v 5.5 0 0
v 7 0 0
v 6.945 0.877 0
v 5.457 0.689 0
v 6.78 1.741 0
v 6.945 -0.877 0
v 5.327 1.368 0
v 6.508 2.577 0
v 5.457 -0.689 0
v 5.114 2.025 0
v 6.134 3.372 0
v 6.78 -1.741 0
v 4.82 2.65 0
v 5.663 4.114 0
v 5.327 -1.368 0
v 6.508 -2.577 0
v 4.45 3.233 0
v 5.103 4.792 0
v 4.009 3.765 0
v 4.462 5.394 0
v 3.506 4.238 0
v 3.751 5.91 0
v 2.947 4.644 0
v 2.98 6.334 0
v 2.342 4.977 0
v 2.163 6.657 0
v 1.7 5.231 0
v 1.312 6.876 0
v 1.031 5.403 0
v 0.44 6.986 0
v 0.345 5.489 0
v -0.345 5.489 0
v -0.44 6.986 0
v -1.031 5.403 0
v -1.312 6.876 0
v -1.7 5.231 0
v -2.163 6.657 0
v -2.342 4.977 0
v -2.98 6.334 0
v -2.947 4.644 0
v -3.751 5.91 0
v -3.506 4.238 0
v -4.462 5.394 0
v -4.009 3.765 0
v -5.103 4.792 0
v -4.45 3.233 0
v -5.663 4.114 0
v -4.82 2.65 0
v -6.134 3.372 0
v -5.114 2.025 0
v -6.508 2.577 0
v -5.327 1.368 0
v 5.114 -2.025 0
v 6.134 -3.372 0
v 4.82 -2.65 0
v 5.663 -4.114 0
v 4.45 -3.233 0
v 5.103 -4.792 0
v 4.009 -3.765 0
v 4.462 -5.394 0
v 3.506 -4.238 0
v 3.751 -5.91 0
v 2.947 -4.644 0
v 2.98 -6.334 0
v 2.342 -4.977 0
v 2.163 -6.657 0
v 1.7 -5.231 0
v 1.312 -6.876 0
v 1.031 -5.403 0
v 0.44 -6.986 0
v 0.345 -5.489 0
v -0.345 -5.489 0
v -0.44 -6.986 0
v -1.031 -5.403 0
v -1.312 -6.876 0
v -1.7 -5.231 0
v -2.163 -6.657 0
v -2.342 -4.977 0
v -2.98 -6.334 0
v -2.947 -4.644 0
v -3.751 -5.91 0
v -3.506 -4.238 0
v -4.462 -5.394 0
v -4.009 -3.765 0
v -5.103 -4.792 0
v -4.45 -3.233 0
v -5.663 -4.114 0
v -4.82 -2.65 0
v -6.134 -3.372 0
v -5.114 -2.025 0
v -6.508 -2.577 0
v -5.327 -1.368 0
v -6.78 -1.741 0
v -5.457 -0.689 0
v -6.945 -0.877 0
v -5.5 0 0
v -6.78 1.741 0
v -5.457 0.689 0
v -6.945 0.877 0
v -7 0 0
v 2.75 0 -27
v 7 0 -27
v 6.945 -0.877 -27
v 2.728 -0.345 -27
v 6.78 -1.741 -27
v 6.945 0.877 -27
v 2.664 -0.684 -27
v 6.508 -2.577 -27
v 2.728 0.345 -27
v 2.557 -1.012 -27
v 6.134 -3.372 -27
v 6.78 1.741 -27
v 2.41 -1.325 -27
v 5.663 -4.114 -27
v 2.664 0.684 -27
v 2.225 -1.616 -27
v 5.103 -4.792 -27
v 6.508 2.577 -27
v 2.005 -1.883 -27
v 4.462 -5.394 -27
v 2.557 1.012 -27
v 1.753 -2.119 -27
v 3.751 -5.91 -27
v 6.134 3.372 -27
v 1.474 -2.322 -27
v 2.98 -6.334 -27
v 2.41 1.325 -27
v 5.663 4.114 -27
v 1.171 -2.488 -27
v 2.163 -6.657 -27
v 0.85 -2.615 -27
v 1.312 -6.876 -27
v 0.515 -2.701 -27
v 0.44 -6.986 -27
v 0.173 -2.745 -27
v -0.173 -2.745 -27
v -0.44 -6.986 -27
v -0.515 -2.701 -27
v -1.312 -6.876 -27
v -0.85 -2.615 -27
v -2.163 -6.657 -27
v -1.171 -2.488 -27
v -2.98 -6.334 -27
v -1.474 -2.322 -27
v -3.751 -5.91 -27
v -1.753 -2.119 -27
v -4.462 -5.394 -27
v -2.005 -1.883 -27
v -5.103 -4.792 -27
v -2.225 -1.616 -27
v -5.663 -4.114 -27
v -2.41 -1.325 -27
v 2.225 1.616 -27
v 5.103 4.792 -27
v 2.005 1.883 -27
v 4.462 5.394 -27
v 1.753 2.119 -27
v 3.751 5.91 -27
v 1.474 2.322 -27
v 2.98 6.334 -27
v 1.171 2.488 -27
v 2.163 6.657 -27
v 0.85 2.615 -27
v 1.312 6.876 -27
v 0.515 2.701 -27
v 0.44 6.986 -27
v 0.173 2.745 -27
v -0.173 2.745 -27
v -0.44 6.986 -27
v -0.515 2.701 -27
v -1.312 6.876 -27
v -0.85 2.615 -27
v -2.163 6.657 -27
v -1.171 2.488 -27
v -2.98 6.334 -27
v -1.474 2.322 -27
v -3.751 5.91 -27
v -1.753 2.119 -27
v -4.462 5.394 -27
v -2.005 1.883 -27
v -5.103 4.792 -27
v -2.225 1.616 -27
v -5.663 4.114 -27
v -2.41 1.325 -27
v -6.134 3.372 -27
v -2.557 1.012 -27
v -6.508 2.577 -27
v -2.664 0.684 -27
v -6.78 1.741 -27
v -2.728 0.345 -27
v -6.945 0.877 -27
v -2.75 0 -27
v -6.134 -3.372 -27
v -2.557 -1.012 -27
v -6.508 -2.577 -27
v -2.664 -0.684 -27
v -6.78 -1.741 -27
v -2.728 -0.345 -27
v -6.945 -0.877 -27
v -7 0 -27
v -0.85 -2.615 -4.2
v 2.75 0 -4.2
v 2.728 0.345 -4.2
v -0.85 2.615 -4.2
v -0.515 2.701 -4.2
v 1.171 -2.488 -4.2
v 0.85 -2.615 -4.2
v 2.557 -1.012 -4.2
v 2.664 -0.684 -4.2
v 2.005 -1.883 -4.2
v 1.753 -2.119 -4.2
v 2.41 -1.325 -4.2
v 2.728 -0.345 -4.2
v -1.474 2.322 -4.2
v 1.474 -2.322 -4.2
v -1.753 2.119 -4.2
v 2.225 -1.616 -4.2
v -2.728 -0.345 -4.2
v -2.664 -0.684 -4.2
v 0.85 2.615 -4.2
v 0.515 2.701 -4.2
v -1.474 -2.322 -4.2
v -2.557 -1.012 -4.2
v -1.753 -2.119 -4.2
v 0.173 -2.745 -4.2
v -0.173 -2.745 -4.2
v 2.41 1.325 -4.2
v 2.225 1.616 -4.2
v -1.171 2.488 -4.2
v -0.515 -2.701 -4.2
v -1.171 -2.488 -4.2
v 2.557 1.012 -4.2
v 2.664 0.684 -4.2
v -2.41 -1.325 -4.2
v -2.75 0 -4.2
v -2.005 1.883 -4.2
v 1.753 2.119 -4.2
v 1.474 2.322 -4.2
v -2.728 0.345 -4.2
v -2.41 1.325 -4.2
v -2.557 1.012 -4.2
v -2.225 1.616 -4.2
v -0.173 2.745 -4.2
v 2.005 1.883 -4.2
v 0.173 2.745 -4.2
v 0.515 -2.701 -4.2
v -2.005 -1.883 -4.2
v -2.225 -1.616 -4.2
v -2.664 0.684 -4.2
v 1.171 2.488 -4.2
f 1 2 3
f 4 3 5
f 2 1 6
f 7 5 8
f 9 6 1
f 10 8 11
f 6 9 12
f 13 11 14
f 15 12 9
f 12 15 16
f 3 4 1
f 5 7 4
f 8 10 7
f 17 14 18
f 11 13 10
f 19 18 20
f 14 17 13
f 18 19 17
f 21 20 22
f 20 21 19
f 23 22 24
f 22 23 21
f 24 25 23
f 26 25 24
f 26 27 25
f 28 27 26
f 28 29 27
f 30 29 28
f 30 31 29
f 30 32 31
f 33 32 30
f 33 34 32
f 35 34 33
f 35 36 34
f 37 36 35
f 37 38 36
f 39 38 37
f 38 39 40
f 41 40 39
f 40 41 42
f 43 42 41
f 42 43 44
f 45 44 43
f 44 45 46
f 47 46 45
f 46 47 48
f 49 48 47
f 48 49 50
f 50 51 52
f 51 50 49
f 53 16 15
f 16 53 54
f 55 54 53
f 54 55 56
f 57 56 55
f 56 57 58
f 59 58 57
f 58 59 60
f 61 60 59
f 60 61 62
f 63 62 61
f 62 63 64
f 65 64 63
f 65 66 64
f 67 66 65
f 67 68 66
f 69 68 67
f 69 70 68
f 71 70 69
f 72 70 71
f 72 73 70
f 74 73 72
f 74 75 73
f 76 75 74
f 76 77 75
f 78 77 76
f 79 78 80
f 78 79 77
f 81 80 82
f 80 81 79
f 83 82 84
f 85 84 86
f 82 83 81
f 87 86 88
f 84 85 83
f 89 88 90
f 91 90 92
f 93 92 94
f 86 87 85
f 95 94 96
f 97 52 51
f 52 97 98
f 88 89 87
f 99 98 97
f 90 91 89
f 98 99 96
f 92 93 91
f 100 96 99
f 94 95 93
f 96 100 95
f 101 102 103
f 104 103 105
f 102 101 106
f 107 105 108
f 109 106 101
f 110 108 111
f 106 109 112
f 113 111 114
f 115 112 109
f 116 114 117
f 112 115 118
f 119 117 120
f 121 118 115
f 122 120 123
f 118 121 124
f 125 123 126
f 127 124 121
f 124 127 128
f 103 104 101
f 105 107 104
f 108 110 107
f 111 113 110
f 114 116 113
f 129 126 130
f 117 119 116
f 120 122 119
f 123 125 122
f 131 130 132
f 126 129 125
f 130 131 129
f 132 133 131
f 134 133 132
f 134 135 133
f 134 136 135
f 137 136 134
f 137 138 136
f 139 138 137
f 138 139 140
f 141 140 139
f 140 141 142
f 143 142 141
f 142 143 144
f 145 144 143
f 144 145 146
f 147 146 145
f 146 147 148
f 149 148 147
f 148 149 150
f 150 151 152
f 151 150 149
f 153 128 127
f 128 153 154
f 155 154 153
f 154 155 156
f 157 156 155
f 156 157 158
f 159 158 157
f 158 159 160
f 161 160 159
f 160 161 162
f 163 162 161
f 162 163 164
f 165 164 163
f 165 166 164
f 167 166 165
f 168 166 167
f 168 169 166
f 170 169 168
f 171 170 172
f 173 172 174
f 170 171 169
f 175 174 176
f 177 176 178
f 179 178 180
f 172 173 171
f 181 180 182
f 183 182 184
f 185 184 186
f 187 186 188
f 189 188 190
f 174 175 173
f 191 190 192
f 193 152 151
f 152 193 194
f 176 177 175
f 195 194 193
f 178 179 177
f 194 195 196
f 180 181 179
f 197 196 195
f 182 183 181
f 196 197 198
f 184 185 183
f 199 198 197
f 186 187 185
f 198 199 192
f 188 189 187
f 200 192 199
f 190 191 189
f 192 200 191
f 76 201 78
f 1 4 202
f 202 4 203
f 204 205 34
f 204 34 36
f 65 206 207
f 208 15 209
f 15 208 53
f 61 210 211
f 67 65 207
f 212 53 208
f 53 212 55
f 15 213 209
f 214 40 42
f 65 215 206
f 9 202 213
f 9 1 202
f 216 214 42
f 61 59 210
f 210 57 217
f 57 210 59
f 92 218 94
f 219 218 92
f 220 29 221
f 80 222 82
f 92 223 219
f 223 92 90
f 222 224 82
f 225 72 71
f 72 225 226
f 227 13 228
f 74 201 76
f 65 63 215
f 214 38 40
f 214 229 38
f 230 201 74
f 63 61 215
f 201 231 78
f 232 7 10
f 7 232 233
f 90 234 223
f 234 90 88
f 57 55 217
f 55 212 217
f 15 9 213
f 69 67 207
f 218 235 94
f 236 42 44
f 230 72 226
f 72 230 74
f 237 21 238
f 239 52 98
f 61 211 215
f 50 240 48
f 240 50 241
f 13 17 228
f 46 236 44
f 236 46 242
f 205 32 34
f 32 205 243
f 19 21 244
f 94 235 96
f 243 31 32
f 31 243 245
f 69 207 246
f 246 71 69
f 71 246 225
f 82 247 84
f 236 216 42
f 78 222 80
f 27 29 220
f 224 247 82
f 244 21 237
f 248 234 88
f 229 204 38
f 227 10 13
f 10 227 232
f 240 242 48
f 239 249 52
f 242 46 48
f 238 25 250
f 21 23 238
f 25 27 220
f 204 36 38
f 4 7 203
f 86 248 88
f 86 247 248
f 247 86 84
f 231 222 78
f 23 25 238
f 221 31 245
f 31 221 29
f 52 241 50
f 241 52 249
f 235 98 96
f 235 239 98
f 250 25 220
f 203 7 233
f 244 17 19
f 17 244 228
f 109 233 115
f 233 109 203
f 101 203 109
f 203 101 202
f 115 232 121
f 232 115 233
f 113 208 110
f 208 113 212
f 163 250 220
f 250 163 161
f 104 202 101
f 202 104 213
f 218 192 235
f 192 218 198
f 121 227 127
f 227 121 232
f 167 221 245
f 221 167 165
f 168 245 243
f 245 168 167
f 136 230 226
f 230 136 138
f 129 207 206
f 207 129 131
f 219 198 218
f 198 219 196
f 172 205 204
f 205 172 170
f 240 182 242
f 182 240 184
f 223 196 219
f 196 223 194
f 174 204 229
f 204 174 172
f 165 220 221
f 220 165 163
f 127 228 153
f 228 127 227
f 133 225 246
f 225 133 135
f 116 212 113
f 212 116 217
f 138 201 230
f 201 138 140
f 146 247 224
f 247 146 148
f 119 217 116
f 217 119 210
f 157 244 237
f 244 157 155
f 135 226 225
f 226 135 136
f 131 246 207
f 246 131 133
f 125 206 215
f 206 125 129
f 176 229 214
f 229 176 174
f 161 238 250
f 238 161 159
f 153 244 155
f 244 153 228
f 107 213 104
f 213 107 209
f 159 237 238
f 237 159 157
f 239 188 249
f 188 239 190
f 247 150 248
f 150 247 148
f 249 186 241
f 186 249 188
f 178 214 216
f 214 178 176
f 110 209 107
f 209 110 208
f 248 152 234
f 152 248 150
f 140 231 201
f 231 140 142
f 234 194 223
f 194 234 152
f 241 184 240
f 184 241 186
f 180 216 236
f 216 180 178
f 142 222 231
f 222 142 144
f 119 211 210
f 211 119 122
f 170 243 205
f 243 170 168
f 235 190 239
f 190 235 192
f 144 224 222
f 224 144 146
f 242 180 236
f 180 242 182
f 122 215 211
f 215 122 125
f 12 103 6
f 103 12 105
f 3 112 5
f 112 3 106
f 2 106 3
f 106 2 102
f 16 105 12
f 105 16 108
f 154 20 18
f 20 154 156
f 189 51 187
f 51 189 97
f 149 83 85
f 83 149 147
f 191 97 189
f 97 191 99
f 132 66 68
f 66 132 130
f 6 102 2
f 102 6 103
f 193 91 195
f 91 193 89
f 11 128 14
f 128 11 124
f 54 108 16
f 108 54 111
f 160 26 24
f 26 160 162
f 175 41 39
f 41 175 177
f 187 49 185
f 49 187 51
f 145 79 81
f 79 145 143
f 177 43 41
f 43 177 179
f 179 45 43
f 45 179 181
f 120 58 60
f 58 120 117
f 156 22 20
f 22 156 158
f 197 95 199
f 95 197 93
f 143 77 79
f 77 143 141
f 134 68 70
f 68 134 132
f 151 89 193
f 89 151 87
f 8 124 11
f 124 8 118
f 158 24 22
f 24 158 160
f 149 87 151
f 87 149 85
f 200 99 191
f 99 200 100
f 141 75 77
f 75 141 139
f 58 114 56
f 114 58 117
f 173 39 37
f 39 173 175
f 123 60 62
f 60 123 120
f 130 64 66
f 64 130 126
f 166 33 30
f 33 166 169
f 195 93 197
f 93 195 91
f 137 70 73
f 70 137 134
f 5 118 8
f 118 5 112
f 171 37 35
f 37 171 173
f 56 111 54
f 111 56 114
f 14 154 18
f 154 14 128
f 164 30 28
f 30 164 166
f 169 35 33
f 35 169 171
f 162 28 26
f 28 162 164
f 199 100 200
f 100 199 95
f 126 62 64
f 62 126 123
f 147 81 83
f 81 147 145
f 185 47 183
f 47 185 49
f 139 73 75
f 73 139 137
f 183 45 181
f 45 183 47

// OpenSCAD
$fn = 50;


difference() {
	union() {
		translate(v = [0, 0, -27.0000000000]) {
			cylinder(h = 27, r = 7.0000000000);
		}
	}
	union() {
		translate(v = [0, 0, 0]) {
			rotate(a = [0, 0, 0]) {
				difference() {
					union() {
						#translate(v = [0, 0, -27.0000000000]) {
							cylinder(h = 27, r = 2.2500000000);
						}
						#translate(v = [0, 0, -4.2000000000]) {
							cylinder(h = 4.2000000000, r1 = 2.7500000000, r2 = 5.5000000000);
						}
						#translate(v = [0, 0, -27.0000000000]) {
							cylinder(h = 27, r = 2.7500000000);
						}
						#translate(v = [0, 0, -27.0000000000]) {
							cylinder(h = 27, r = 2.2500000000);
						}
					}
					union();
				}
			}
		}
	}
}
